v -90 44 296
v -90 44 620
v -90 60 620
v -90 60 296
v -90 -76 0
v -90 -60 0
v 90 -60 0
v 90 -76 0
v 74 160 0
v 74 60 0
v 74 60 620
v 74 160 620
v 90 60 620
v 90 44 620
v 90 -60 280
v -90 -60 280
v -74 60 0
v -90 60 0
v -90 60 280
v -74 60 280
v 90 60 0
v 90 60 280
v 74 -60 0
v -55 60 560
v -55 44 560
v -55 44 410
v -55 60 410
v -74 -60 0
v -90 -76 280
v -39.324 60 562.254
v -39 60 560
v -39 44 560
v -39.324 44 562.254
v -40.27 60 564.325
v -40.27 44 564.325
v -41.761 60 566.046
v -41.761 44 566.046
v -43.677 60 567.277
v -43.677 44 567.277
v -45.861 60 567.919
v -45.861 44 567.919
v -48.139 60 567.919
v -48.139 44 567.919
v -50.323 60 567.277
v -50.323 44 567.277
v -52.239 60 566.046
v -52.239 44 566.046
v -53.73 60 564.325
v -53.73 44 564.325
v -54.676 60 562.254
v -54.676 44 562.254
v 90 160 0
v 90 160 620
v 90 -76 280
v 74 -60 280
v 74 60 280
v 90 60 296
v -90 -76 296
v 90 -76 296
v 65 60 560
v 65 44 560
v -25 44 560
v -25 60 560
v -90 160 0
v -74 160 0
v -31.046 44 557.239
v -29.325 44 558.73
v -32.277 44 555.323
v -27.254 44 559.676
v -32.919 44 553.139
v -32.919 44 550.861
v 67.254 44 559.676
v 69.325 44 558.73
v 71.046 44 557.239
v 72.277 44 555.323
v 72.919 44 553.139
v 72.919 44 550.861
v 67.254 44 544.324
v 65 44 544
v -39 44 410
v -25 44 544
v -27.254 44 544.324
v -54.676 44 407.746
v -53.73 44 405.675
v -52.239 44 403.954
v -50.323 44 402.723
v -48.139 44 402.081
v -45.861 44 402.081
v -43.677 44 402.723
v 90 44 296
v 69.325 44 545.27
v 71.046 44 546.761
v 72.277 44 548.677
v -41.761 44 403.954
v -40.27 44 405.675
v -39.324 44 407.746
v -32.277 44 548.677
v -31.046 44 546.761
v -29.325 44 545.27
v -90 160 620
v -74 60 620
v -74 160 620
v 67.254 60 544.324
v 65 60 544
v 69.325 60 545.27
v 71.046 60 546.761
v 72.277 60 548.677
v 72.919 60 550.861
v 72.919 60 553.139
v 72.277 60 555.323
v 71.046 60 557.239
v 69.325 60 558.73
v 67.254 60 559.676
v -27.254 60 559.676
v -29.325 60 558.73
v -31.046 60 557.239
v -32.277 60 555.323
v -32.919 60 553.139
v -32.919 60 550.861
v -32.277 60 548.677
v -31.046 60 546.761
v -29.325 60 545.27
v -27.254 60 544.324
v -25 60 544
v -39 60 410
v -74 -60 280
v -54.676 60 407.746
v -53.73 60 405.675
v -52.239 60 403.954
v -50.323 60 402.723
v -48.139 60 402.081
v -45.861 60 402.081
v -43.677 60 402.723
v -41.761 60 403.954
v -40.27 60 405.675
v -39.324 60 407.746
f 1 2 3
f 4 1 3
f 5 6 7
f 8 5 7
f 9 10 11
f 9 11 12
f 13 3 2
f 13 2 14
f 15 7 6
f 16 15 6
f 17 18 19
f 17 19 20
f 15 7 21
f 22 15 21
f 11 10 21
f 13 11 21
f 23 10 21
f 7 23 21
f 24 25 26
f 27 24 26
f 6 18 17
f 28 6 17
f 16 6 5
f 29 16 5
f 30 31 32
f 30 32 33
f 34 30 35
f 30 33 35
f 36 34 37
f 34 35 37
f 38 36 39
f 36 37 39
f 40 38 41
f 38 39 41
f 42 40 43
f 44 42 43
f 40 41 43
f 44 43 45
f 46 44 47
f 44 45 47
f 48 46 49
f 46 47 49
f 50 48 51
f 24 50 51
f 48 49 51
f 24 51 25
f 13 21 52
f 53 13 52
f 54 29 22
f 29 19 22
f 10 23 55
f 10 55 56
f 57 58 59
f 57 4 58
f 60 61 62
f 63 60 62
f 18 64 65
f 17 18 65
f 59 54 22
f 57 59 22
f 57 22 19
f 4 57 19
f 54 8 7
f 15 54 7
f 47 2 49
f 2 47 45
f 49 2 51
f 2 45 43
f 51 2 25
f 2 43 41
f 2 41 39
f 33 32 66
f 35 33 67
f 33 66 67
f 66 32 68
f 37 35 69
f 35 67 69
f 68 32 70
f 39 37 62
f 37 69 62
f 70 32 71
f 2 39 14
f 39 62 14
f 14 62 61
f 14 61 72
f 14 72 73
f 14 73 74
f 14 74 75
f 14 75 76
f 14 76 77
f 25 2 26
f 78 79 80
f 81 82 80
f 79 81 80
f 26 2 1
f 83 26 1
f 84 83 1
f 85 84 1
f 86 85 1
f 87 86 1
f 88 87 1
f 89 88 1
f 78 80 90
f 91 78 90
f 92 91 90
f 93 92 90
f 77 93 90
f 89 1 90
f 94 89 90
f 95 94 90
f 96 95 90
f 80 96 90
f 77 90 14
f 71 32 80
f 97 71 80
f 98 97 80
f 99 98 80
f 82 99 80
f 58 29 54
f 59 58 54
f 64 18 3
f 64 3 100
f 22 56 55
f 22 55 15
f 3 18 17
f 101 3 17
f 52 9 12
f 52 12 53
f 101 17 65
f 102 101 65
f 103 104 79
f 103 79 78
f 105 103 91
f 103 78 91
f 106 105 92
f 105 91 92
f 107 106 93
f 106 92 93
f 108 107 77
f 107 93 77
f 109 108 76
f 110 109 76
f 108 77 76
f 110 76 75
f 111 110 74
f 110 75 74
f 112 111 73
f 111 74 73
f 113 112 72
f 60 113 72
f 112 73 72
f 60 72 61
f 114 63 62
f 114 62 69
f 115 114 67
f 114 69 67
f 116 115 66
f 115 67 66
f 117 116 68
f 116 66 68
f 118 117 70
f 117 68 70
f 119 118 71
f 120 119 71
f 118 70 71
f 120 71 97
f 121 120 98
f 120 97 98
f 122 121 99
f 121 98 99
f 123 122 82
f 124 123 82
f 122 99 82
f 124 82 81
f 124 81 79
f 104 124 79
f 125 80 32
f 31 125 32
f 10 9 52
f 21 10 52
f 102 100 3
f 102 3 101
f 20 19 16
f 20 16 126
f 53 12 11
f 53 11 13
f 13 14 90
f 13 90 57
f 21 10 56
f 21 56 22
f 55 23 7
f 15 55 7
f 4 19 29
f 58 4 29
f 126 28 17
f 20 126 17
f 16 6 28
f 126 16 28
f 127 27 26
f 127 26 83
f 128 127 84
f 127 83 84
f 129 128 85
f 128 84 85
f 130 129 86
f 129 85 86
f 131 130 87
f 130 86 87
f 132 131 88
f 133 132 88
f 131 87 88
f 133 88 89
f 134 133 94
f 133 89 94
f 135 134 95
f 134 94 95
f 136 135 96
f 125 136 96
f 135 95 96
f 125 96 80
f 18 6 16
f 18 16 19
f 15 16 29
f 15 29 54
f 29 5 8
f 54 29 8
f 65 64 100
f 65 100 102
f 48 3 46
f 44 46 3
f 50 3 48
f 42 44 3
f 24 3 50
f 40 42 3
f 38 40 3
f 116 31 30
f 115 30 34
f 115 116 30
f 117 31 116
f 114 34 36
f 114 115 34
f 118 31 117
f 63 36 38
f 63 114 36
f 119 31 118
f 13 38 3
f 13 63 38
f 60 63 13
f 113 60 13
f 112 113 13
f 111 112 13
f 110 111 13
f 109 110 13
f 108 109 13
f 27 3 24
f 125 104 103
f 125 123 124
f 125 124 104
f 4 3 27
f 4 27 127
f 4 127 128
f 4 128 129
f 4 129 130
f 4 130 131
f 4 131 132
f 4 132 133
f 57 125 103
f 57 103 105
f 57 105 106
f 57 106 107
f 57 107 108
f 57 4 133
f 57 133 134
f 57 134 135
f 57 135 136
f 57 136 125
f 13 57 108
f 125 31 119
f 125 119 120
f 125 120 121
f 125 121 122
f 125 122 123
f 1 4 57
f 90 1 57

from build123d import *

# Parameters (mm, degrees)
F0_W     = 16
F0_H     = 120
F1_DEPTH = 280
F0_H_2   = 100
F2_DEPTH = 620
F3_DEPTH = 280
F4_W     = 180
F4_H     = 16
F4_W_2   = 16
F4_H_2   = 120
F4_W_3   = 164
F5_DEPTH = 16
F6_W     = 180
F6_H     = 16
F7_DEPTH = 324
F9_DEPTH = 16


with BuildPart() as f1:
    # F0 (on Top) → F1 (new body)
    with BuildSketch(Plane.XY):
        with Locations((-82, 0)):
            Rectangle(F0_W, F0_H)
        with Locations((82, 0)):
            Rectangle(F0_W, F0_H)
    extrude(amount=F1_DEPTH)


with BuildPart() as f2:
    # F0 (on Top) → F2 (new body)
    with BuildSketch(Plane.XY):
        with Locations((-82, 110)):
            Rectangle(F0_W, F0_H_2)
        with Locations((82, 110)):
            Rectangle(F0_W, F0_H_2)
    extrude(amount=F2_DEPTH)


with BuildPart() as f3:
    # F0 (on Top) → F3 (new body, through all)
    with BuildSketch(Plane.XY):
        Polygon((-74, -60), (-90, -60), (-90, -76), (90, -76), (90, -60), (74, -60), align=None)
    extrude(amount=F3_DEPTH)


with BuildPart() as f5:
    # F4 (on face) → F5 (new body)
    with BuildSketch(Plane.XY.offset(280)):
        with Locations((0, -68)):
            Rectangle(F4_W, F4_H)
        with Locations((-82, 0)):
            Rectangle(F4_W_2, F4_H_2)
        with Locations((8, 0)):
            Rectangle(F4_W_3, F4_H_2)
    extrude(amount=F5_DEPTH)


with BuildPart() as f7:
    # F6 (on face) → F7 (new body, through all)
    with BuildSketch(Plane.XY.offset(296)):
        with Locations((0, 52)):
            Rectangle(F6_W, F6_H)
    extrude(amount=F7_DEPTH)

    # F8 (on face) → F9 (cut, through all)
    with BuildSketch(Plane.XZ.offset(-44)):
        with BuildLine():
            Line((65, 560), (-25, 560))
            ThreePointArc((-25, 560), (-33, 552), (-25, 544))
            Line((-25, 544), (65, 544))
            ThreePointArc((65, 544), (73, 552), (65, 560))
        make_face()
        with BuildLine():
            ThreePointArc((-39, 560), (-47, 568), (-55, 560))
            Line((-55, 560), (-55, 410))
            ThreePointArc((-55, 410), (-47, 402), (-39, 410))
            Line((-39, 410), (-39, 560))
        make_face()
    extrude(amount=-F9_DEPTH, mode=Mode.SUBTRACT)


solid = Compound([f1.part, f2.part, f3.part, f5.part, f7.part])
